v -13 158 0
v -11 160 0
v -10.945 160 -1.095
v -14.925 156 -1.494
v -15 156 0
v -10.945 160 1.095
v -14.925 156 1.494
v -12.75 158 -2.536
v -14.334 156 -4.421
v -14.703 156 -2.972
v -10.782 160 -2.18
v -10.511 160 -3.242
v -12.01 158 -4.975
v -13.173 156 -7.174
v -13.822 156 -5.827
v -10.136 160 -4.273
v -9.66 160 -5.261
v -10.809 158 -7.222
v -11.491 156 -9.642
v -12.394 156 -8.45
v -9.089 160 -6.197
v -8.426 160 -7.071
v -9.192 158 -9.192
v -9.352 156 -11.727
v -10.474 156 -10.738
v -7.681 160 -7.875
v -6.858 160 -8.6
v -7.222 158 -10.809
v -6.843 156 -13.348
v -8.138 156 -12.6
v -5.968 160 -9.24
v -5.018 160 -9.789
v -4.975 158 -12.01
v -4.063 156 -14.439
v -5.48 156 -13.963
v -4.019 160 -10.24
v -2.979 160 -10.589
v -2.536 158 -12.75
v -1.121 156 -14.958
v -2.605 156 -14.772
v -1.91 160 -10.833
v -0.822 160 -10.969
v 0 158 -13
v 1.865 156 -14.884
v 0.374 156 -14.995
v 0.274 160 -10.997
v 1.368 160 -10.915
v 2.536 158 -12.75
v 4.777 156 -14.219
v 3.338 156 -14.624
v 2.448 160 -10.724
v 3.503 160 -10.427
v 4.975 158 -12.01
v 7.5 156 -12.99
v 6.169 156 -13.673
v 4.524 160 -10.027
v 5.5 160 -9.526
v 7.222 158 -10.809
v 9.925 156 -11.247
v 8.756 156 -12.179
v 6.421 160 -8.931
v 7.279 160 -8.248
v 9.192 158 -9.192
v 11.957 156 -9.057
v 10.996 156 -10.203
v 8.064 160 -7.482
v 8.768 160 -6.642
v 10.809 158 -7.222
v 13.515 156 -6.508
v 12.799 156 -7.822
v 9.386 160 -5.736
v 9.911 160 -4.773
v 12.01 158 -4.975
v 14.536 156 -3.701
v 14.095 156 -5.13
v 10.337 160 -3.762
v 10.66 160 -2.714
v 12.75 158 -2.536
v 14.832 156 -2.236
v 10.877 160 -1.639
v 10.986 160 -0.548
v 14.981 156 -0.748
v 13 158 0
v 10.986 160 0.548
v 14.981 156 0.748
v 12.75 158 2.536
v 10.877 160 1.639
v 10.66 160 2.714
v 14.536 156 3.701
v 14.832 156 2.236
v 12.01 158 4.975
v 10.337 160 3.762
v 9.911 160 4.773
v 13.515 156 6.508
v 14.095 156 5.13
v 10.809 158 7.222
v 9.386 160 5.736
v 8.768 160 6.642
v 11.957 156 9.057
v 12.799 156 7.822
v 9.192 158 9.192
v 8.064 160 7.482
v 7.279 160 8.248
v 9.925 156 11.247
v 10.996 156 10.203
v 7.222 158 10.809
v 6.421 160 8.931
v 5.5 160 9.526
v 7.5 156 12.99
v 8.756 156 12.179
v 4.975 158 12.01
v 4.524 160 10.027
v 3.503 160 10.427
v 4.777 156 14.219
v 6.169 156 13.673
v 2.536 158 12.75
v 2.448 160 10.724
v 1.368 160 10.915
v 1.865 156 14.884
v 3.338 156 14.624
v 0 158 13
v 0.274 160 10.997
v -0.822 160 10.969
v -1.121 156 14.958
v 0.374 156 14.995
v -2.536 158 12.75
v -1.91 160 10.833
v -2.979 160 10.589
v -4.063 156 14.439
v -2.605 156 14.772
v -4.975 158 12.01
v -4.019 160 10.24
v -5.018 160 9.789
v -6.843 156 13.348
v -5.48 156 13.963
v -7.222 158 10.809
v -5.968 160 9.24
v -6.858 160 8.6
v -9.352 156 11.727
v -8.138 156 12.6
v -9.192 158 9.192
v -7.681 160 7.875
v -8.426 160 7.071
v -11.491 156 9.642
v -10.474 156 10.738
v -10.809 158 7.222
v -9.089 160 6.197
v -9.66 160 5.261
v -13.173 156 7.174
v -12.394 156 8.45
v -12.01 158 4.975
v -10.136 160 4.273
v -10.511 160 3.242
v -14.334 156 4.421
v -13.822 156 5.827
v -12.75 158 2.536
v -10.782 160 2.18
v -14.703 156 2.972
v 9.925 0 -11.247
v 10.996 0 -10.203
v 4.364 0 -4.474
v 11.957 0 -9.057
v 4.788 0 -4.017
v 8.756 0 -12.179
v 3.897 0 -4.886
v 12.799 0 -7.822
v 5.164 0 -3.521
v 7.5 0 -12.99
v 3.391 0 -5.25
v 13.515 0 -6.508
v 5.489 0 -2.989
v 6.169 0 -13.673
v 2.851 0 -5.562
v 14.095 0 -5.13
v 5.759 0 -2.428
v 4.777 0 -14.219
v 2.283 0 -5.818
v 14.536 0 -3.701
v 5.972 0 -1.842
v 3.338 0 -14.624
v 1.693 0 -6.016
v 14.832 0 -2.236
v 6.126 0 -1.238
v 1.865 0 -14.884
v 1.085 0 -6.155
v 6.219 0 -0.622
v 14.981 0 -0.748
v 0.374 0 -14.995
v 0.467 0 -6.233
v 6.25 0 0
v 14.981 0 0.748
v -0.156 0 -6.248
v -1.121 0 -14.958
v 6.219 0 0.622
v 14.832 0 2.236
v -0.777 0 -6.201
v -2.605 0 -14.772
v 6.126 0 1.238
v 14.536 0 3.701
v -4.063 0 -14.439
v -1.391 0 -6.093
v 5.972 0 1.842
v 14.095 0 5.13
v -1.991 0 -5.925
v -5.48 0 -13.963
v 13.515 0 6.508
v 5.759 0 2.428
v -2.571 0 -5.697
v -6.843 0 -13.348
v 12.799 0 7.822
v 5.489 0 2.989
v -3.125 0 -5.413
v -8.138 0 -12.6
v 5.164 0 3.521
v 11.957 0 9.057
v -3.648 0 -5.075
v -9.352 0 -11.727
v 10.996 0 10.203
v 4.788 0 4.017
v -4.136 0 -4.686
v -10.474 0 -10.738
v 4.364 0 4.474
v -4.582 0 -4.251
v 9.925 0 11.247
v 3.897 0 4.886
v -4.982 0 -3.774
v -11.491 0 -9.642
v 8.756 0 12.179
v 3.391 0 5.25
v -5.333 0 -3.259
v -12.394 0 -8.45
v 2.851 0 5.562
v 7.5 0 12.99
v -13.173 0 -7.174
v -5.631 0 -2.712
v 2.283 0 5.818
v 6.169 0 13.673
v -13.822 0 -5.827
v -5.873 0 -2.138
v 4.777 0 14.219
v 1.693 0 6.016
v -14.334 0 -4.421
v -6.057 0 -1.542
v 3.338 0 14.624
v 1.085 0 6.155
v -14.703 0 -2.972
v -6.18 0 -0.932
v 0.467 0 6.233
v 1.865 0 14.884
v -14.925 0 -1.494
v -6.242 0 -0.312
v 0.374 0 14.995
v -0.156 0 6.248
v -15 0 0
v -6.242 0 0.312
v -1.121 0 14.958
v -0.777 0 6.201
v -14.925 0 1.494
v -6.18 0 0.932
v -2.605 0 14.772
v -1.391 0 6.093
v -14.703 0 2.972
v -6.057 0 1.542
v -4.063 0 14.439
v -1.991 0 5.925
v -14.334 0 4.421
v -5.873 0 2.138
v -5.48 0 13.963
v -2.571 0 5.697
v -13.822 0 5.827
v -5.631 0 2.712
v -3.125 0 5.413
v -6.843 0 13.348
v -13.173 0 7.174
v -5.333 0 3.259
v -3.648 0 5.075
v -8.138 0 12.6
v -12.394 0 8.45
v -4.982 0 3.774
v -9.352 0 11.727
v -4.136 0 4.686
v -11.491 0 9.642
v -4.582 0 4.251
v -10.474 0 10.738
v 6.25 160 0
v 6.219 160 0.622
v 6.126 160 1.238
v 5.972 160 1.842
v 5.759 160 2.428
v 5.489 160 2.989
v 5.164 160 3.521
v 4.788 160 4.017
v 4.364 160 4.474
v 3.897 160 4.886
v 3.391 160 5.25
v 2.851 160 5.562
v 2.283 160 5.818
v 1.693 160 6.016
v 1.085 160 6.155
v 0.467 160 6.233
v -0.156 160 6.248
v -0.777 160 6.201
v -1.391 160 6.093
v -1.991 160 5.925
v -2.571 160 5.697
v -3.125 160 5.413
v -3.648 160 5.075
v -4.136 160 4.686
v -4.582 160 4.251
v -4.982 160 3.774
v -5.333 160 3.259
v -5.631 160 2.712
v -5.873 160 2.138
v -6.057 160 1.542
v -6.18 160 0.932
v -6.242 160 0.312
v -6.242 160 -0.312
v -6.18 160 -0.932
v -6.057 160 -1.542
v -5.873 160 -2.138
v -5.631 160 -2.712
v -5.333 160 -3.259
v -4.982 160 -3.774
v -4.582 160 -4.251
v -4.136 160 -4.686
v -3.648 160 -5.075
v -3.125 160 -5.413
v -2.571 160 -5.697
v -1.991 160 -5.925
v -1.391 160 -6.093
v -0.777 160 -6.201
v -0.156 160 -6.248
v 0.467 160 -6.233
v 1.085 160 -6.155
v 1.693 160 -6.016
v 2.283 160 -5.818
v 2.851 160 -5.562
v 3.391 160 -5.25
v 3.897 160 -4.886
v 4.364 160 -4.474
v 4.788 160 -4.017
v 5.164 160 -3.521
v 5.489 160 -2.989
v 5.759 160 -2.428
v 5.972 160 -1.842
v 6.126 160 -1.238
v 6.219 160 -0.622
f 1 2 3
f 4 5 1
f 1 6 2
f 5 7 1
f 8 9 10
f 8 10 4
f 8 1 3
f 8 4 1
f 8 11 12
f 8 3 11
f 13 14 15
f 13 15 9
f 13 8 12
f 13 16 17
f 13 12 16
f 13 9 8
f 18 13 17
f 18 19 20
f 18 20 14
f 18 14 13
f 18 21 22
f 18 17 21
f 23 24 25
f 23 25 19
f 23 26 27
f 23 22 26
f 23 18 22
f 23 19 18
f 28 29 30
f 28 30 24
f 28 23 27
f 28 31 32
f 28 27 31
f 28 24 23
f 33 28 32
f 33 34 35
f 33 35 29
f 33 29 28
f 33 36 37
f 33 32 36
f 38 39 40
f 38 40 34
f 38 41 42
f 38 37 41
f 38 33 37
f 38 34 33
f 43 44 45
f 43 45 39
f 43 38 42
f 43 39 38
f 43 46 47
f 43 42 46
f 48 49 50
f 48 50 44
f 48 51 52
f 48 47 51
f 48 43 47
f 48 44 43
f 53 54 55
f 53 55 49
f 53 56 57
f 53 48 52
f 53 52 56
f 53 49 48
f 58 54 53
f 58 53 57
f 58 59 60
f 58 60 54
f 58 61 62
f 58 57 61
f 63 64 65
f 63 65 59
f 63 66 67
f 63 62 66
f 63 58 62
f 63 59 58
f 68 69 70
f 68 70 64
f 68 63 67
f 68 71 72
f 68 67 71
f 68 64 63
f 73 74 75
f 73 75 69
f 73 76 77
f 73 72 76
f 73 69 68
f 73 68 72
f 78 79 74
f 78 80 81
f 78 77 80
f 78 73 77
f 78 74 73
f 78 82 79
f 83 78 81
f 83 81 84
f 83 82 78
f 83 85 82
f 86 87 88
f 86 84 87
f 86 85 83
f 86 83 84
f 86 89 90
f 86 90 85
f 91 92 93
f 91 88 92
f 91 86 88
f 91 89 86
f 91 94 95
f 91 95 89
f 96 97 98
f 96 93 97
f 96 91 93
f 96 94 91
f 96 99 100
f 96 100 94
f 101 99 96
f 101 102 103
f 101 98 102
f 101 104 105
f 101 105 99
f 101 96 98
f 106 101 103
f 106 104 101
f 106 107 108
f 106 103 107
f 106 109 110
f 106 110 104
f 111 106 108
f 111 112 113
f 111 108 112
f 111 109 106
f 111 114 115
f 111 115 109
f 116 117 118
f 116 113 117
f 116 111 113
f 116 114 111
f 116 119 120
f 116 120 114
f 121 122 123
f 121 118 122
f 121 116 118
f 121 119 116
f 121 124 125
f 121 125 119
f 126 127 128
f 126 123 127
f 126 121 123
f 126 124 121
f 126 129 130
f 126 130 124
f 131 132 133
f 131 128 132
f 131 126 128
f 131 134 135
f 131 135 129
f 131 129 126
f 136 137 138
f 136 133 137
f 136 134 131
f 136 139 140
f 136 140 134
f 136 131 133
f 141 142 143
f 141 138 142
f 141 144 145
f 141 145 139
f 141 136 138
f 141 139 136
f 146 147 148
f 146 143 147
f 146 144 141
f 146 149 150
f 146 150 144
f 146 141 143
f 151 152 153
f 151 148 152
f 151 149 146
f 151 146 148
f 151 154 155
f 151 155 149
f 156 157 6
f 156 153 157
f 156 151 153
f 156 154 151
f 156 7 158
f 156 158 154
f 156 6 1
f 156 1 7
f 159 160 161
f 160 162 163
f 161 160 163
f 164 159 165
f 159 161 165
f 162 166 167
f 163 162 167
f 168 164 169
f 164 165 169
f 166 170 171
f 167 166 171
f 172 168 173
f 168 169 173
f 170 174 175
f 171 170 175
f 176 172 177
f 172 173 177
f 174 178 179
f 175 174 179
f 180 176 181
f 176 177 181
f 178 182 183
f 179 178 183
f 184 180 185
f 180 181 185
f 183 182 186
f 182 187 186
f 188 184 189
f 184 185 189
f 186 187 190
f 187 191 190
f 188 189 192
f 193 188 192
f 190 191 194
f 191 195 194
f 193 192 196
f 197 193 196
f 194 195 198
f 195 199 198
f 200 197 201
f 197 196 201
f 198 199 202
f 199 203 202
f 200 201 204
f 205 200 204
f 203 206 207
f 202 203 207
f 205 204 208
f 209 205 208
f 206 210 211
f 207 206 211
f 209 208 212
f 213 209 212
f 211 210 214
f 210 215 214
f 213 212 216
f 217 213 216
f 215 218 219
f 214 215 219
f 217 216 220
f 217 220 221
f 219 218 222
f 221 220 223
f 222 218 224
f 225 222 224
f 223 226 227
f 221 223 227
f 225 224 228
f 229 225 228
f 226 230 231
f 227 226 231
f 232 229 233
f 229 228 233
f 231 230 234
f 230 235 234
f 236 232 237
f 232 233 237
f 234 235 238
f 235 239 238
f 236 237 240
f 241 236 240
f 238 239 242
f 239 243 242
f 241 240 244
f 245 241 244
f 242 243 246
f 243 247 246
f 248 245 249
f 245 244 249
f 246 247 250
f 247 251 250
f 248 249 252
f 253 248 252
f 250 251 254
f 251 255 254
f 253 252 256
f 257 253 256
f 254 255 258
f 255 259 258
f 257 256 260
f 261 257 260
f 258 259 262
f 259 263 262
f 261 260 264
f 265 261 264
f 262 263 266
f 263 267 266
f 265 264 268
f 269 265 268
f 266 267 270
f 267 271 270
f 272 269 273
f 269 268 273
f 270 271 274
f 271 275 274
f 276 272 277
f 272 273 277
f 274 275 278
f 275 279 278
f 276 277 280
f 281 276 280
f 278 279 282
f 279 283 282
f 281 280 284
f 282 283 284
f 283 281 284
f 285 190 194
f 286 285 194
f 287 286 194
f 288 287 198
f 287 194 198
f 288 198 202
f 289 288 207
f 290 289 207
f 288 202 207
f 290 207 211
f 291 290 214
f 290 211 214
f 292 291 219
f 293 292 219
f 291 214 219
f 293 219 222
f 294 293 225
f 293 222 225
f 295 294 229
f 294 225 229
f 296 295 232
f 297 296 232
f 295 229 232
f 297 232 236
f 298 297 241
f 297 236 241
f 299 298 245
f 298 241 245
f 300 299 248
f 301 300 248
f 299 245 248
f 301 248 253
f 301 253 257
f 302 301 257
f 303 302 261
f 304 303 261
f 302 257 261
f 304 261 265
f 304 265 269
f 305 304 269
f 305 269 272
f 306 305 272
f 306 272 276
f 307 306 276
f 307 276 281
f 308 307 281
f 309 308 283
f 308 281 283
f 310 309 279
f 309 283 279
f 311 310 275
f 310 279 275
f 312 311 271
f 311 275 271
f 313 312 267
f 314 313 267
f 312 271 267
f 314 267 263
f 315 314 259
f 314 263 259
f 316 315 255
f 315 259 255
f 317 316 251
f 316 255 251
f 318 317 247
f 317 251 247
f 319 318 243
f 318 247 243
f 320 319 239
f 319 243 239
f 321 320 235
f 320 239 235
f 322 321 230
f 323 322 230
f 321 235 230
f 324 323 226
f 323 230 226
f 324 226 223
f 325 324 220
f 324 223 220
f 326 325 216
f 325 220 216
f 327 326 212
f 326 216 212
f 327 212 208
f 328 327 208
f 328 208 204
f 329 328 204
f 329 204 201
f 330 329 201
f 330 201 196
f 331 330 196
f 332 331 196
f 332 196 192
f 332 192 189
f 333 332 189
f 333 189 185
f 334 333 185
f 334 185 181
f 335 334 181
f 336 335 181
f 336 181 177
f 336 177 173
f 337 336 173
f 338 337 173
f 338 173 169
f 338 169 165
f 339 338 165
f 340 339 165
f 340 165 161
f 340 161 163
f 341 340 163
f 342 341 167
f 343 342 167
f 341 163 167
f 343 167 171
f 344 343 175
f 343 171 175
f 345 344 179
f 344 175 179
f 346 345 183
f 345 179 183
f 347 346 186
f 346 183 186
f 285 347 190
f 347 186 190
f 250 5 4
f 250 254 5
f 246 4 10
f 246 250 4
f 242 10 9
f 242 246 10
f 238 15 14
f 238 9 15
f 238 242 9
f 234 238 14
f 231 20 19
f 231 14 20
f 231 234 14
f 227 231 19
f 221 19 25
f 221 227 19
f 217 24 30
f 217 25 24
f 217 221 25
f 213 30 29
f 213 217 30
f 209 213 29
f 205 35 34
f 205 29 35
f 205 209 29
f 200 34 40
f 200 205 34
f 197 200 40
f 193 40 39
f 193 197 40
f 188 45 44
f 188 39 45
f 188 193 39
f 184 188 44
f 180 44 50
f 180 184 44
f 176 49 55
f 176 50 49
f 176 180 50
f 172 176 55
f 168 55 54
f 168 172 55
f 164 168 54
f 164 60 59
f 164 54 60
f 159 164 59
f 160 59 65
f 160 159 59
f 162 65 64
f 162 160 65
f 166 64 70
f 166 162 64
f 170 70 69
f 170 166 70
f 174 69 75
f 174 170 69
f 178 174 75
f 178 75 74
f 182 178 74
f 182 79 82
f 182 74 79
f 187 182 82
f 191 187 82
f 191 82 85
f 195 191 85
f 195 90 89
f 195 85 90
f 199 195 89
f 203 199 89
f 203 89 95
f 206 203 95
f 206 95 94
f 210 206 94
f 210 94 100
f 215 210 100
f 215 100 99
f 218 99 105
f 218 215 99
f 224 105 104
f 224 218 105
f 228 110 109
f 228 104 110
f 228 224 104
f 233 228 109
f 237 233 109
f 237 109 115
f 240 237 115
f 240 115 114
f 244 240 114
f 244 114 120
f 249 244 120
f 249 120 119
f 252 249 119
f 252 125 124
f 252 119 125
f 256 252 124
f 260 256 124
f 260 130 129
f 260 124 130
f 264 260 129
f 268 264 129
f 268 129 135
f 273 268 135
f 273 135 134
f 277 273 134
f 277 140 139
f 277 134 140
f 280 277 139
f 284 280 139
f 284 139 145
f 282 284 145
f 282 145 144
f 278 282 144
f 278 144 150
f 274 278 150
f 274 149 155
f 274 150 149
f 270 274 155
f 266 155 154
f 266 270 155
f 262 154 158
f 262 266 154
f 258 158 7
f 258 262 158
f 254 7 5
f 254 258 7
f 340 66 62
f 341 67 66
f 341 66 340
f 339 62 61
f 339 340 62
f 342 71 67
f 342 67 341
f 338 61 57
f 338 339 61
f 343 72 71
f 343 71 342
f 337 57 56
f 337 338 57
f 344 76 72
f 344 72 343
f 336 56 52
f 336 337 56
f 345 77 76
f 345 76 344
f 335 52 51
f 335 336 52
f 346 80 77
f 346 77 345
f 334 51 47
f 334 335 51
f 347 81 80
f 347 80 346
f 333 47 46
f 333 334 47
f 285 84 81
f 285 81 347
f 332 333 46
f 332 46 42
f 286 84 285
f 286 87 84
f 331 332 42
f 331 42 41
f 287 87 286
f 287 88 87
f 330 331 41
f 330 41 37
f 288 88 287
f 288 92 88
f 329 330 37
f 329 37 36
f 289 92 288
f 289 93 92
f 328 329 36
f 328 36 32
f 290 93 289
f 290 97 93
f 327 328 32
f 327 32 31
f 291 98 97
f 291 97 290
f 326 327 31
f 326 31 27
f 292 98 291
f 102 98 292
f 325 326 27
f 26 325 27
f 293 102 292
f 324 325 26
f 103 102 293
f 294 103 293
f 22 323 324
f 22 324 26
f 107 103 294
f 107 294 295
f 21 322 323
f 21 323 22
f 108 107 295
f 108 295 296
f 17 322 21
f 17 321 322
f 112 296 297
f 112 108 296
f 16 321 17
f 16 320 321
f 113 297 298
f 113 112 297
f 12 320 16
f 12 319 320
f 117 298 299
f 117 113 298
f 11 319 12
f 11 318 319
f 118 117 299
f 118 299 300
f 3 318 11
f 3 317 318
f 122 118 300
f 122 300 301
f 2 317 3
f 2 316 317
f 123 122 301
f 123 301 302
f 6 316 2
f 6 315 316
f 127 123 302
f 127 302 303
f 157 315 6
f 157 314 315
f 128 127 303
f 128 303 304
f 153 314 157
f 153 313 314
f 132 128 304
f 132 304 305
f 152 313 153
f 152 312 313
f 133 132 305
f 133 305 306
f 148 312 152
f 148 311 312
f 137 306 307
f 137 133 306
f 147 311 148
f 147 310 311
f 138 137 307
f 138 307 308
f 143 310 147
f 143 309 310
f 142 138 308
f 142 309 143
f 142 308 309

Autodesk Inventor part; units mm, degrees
ref_plane "YZ Plane" through (0, 0, 0) normal (1, 0, 0) x (0, 1, 0)
ref_plane "XZ Plane" through (0, 0, 0) normal (0, 1, 0) x (-1, 0, 0)
ref_plane "XY Plane" through (0, 0, 0) normal (0, 0, 1) x (1, 0, 0)
sketch "Skizze1" plane through (0, 0, 0) normal (0, 1, 0) x (-1, 0, 0)
  circle A0 centre (0, 0) radius 15
  dimension "d0" = 30
extrude "Extrusion1" add sketch "Skizze1" along normal blind 160
chamfer "Fasen1" distance 4 angle 45 1 edges at (15, 160, 0)
sketch "Skizze2" plane through (0, 0, 0) normal (0, -1, 0) x (1, 0, 0)
  circle A0 centre (0, 0) radius 11 projected
  circle A1 centre (0, 0) radius 6.25
  dimension "d6" = 12.5
extrude "Extrusion2" cut sketch "Skizze2" against normal up to surface (160 mm away) contours A1
properties part number "15" material "Kupfer, Guss"
